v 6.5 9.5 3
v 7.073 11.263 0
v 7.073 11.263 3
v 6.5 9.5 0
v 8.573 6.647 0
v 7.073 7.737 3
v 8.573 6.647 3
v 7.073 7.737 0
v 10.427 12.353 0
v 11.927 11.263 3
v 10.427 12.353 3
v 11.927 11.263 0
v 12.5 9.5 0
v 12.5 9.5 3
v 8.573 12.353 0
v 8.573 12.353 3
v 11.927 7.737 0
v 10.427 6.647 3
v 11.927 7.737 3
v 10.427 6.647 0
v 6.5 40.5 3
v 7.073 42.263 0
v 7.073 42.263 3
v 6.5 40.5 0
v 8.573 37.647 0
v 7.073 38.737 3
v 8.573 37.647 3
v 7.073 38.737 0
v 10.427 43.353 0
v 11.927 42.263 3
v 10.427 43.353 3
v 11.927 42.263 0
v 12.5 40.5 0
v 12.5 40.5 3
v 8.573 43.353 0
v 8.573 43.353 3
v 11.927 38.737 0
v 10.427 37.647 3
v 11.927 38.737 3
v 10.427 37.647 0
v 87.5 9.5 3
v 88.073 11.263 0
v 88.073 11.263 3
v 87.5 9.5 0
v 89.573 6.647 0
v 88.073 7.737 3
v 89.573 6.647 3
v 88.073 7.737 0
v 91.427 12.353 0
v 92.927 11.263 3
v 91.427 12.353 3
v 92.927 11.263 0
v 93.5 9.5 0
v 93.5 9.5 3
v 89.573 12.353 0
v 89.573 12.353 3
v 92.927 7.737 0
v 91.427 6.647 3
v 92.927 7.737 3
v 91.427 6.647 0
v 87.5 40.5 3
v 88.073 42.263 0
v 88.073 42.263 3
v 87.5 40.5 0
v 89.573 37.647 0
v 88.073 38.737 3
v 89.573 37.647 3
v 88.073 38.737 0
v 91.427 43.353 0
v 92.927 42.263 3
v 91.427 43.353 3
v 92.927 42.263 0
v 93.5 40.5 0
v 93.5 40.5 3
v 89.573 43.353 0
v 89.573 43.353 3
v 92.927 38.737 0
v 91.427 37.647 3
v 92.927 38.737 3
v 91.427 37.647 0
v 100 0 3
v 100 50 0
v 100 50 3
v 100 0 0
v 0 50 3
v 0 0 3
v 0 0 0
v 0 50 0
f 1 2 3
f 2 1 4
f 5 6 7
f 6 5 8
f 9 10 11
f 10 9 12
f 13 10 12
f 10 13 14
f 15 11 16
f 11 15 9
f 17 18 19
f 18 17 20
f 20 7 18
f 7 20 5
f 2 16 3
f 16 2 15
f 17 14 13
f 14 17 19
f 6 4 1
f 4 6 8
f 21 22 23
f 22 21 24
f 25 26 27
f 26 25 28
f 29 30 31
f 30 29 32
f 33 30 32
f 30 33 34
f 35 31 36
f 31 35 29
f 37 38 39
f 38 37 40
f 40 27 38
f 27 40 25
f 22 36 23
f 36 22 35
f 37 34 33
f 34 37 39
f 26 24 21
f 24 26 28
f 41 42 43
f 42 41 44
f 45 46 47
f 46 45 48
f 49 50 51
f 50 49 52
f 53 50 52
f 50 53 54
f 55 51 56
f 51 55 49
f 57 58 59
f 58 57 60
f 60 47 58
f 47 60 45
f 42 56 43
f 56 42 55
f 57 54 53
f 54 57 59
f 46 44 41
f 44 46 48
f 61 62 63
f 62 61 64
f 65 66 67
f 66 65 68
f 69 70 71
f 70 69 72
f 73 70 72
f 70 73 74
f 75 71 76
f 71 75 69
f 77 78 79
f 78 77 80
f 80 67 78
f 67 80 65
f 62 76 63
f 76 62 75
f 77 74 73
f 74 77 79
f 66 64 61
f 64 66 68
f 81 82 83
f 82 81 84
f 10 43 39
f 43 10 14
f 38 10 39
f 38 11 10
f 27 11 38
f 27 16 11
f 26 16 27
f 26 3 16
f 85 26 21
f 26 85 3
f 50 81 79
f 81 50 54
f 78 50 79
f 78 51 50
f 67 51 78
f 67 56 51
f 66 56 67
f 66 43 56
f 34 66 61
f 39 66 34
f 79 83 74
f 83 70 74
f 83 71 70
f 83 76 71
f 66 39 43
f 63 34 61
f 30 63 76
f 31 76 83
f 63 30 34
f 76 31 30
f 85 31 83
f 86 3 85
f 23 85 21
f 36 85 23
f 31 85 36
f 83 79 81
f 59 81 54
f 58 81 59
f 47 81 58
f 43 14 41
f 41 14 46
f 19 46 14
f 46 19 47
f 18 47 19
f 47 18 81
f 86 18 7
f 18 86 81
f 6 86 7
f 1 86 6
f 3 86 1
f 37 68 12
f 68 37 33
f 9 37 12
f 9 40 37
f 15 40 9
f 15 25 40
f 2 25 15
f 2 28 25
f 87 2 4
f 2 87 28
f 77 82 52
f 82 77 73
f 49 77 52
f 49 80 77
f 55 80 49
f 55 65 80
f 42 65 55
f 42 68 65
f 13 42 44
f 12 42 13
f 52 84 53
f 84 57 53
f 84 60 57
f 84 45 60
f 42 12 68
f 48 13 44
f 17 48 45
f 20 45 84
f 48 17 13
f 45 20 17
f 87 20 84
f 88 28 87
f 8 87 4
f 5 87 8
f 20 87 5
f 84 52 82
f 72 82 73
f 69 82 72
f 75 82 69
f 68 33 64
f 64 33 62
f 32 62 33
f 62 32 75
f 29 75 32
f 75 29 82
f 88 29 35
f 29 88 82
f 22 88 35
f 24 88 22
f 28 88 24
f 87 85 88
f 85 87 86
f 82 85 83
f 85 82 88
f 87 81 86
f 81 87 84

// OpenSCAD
placa = [100,50,3];

furo = 3;
margem = 8;

difference() {
    
    cube(placa);

    abs_margem = margem + furo  / 2;
    xvalues = [abs_margem, placa.x - abs_margem];
    yvalues = [abs_margem, placa.y - abs_margem];

    
    for( x = xvalues, y = yvalues) {
        color("red")
        translate([ x, y, -1 ]) 
        cylinder(placa.z + 3, furo, furo);
    }
}


 
